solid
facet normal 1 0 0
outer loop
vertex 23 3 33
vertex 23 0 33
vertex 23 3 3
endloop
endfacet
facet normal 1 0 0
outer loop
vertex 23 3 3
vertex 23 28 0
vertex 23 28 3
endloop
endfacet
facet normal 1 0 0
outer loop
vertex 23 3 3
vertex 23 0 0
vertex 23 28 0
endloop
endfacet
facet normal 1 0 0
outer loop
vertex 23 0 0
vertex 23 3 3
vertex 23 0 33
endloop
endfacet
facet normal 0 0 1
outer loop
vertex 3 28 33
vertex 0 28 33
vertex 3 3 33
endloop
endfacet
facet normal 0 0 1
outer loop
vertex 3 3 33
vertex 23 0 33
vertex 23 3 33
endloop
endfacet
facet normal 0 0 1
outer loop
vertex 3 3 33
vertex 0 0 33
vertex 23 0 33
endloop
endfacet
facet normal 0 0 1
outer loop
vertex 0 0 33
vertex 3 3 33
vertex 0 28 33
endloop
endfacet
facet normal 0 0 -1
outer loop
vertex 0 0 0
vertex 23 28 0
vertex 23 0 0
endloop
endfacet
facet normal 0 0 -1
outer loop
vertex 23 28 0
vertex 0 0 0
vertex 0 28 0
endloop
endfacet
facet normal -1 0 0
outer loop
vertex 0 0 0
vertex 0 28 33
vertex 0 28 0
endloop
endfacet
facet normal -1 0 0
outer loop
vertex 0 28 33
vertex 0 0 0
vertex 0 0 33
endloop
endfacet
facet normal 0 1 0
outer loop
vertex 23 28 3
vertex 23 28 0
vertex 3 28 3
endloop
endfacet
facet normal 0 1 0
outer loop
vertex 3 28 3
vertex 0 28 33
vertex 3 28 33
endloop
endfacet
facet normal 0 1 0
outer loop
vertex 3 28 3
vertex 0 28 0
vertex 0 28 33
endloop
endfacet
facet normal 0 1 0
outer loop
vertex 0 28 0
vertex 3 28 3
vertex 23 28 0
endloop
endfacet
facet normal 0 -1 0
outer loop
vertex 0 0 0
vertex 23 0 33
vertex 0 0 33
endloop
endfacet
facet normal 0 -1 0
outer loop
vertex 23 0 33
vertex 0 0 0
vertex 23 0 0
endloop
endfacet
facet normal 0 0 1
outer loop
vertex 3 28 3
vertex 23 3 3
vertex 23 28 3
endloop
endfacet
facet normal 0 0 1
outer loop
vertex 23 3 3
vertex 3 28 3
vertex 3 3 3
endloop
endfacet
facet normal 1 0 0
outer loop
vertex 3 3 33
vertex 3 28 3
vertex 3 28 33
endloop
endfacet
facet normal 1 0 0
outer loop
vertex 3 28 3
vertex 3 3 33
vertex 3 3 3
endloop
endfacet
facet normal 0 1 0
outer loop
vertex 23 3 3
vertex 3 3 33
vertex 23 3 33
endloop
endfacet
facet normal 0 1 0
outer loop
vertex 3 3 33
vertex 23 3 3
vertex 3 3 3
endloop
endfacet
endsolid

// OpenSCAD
// Cuboid three-face guard. Units: mm. Lengths exclude wall.
x=20;
y=25;
z=30;
wall=3;
mode="single"; // "single", "mirrored", "eight"
assert(min(x,y,z,wall)>=0.2);
module corner() {
    difference() {
        cube([x+wall,y+wall,z+wall]);
        translate([wall,wall,wall]) cube([x+1,y+1,z+1]);
    }
}
module reflected() { translate([x+wall,0,0]) mirror([1,0,0]) corner(); }
if(mode=="single") corner();
if(mode=="mirrored") reflected();
if(mode=="eight") for(row=[0:1]) for(col=[0:3])
    translate([col*(x+wall+6),row*(y+wall+6),0])
        if(col%2==0) corner(); else reflected();
